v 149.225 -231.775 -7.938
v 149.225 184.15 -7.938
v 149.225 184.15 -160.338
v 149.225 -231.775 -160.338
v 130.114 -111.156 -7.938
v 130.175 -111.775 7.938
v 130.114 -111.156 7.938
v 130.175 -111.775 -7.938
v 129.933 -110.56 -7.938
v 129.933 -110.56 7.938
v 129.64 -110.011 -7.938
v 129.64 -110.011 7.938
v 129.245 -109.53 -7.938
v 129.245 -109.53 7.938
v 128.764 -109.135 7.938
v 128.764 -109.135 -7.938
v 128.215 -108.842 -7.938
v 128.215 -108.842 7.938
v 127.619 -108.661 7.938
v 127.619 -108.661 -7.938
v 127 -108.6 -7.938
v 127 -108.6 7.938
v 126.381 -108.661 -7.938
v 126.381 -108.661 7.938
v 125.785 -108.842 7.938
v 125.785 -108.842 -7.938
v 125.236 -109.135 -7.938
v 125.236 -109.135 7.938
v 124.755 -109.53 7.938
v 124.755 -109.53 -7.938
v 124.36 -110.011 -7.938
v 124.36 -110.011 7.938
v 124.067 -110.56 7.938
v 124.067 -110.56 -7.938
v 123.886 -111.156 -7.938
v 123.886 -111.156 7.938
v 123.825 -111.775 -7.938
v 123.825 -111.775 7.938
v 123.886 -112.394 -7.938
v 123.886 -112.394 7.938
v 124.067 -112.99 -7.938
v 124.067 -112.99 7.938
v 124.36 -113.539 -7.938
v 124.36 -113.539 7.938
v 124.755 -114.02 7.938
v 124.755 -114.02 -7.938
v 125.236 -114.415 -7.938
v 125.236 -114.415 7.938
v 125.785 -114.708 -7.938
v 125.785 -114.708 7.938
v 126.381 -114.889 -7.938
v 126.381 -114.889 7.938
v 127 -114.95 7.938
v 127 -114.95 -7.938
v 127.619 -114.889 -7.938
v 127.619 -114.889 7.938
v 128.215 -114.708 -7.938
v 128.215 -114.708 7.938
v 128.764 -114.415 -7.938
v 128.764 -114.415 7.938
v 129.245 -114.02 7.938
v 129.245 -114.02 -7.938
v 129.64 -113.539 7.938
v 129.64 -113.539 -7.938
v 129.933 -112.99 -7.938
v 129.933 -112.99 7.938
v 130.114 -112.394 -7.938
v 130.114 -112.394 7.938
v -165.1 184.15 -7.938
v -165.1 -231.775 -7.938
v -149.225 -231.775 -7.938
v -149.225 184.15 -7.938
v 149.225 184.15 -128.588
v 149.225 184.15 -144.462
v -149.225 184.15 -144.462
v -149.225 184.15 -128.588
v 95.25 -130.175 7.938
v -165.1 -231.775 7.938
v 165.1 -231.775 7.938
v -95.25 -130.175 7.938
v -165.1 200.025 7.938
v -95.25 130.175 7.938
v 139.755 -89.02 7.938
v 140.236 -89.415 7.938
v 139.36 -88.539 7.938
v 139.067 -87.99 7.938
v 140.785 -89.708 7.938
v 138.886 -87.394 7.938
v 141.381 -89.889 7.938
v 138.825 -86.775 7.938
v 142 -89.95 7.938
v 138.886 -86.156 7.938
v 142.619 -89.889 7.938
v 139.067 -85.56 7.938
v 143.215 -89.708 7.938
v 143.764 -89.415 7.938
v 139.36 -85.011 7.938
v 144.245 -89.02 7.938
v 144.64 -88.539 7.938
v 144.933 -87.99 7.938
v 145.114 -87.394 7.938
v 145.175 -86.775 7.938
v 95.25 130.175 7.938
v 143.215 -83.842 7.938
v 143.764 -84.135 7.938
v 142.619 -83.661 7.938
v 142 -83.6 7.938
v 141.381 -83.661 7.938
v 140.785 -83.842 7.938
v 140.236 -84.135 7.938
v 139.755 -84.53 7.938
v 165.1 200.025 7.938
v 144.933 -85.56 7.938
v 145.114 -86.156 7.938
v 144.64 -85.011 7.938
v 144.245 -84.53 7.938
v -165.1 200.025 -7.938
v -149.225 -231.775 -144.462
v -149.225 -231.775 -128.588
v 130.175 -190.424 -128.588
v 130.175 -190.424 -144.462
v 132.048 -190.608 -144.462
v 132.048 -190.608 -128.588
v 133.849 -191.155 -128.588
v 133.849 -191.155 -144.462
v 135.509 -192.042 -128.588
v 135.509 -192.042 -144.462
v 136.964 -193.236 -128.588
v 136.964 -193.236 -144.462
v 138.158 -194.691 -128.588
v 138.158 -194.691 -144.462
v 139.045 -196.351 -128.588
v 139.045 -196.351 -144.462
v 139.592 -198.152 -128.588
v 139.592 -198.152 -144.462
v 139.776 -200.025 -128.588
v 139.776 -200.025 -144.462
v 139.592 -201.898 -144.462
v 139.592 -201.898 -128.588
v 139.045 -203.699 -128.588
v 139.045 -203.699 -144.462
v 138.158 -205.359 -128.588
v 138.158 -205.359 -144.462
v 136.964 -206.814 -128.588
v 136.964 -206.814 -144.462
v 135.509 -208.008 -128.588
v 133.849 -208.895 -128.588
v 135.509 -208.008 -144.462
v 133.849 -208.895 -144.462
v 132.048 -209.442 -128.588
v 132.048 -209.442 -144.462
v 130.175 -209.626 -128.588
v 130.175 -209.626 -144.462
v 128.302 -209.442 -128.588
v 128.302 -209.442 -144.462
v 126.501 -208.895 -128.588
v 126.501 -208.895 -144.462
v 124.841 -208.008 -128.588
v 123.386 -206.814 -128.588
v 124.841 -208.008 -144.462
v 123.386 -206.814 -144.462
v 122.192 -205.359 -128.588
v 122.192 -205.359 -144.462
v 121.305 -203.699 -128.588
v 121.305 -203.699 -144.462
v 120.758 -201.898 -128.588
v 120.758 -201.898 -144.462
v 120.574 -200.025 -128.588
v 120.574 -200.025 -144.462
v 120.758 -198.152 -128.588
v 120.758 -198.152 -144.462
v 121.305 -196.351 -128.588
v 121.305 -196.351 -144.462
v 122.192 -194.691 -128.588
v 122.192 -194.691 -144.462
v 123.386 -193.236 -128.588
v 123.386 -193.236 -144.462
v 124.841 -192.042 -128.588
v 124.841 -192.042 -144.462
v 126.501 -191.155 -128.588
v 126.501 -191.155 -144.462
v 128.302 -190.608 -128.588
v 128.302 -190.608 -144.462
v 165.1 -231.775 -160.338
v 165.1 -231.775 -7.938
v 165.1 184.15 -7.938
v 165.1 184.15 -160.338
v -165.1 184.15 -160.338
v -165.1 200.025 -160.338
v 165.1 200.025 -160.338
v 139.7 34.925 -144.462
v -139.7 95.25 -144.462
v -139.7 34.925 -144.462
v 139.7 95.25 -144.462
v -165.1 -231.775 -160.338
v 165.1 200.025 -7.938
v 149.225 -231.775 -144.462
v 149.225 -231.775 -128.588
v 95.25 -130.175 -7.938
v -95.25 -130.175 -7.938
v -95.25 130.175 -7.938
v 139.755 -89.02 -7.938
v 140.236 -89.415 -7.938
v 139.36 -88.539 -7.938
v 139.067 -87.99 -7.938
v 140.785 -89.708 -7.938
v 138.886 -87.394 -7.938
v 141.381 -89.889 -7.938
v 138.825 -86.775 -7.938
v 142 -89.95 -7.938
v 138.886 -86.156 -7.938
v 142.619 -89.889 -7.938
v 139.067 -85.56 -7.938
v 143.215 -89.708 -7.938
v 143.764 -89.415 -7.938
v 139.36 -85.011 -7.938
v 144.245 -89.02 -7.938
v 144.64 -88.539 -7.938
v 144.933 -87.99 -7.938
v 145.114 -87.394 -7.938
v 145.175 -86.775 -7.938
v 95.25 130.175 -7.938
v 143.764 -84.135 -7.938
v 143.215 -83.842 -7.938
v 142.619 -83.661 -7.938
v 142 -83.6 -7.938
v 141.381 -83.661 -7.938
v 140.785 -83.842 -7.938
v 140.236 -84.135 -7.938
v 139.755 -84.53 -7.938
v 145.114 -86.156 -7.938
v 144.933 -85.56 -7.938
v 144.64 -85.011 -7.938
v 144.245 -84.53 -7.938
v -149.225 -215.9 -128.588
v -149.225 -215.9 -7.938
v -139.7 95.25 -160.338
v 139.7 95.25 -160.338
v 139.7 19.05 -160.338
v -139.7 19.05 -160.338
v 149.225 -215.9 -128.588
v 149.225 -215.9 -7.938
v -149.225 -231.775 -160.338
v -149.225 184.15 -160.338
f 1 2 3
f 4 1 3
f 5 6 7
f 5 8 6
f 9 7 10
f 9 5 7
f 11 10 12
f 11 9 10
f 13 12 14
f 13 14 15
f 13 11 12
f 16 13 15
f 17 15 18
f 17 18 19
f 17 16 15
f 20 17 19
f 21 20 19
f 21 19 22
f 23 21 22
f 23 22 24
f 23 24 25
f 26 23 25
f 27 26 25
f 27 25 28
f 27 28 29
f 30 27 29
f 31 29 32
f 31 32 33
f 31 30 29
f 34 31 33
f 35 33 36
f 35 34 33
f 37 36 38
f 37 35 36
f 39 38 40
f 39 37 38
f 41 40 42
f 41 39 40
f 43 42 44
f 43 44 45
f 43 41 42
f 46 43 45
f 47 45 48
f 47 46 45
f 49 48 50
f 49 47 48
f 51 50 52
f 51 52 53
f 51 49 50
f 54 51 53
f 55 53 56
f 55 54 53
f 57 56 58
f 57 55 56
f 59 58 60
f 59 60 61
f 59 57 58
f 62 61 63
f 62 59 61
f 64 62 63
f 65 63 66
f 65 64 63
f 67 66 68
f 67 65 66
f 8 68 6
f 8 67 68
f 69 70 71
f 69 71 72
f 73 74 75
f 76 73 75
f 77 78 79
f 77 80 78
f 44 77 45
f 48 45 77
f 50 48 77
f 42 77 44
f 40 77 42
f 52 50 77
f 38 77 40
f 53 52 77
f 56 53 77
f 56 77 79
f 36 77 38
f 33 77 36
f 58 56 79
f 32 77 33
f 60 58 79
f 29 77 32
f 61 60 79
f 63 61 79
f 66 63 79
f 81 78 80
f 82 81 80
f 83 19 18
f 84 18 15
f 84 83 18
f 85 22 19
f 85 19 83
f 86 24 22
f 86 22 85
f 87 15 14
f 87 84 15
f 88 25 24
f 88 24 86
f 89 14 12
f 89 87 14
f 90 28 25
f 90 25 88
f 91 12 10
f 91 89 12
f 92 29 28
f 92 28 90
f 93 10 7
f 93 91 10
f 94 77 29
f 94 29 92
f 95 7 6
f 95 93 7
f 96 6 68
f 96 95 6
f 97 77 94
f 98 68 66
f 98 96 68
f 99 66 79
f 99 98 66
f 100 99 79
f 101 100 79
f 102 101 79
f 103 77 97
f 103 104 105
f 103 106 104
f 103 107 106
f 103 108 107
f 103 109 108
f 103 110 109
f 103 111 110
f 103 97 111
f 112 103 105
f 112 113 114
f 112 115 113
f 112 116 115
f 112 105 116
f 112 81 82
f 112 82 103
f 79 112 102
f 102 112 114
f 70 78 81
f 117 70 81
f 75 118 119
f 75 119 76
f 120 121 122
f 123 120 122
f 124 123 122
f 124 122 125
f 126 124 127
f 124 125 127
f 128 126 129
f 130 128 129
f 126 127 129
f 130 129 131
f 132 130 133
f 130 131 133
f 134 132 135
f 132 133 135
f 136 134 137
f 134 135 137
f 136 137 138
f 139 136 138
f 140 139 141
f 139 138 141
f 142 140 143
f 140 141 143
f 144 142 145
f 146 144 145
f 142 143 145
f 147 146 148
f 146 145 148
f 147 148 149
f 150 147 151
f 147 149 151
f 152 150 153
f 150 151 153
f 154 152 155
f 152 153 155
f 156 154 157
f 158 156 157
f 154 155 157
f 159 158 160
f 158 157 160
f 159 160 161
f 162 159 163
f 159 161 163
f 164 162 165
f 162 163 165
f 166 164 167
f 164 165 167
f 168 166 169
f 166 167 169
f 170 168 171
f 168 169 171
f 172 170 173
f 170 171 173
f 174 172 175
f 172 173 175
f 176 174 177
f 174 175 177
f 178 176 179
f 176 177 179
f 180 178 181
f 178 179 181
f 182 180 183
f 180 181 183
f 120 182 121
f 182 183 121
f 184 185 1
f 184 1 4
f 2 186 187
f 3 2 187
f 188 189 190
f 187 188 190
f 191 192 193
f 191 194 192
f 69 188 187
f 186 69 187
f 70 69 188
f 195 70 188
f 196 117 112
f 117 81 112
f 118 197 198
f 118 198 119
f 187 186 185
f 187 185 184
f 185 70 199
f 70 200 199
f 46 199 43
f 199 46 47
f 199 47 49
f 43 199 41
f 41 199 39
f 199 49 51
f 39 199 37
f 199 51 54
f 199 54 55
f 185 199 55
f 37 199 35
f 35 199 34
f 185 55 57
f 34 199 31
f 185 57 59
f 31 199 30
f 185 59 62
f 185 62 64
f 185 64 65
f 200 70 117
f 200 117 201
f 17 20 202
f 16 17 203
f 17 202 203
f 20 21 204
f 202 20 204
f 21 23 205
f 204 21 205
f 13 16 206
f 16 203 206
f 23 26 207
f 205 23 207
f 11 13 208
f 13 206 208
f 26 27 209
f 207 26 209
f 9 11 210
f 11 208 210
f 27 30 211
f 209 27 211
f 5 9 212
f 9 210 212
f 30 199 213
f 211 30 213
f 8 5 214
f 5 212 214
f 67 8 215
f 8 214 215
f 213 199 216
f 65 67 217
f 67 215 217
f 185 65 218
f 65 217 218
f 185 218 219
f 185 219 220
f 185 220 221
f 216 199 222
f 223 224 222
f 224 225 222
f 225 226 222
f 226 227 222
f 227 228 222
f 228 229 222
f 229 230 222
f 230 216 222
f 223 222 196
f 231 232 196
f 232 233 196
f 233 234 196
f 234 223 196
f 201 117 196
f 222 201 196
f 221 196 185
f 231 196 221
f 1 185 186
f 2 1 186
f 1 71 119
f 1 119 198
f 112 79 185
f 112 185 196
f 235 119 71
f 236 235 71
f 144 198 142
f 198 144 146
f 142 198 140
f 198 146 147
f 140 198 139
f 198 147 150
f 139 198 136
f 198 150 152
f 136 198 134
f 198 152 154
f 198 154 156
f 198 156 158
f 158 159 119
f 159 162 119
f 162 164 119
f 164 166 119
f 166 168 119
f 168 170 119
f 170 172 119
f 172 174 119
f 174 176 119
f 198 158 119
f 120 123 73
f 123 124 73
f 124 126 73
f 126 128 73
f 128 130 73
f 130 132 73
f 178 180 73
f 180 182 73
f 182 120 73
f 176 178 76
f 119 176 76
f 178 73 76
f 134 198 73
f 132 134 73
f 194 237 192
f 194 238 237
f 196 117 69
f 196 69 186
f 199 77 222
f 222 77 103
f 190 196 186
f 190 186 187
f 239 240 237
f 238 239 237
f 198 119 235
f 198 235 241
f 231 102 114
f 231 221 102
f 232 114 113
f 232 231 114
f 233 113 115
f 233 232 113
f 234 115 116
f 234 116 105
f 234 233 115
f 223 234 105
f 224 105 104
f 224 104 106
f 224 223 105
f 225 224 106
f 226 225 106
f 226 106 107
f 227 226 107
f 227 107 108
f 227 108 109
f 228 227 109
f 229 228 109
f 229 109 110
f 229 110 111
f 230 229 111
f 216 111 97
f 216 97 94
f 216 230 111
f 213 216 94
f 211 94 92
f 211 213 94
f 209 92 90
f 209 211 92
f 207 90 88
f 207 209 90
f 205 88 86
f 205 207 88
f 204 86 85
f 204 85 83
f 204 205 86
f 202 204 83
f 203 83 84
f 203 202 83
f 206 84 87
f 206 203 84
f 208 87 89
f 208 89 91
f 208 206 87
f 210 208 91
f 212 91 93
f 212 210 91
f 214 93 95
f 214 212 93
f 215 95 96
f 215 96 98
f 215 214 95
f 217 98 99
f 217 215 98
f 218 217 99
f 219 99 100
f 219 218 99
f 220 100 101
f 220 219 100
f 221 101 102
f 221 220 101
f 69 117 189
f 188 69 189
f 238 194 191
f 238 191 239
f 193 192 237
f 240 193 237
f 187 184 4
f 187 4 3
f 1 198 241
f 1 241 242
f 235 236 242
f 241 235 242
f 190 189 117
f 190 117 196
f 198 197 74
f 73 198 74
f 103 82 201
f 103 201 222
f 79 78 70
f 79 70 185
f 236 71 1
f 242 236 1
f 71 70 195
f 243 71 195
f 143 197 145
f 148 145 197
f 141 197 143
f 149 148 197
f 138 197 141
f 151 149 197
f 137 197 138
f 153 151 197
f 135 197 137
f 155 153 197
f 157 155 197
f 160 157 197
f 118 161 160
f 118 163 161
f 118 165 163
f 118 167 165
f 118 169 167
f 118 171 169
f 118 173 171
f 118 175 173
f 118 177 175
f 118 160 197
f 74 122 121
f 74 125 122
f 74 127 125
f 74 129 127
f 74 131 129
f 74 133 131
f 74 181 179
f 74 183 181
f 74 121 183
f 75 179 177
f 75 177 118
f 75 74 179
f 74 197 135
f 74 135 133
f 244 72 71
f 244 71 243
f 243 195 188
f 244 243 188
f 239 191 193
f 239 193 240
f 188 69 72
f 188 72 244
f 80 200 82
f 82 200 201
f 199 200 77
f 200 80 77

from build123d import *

# Parameters (mm, degrees)
SKETCH1_W           = 330.2
SKETCH1_H           = 431.8
SKETCH1_R           = 3.175
SKETCH1_W_2         = 190.5
SKETCH1_H_2         = 260.35
BOSS_EXTRUDE1_DEPTH = 7.9375
SKETCH3_W           = 152.4
SKETCH3_H           = 415.925
BOSS_EXTRUDE2_DEPTH = 15.875
BOSS_EXTRUDE6_START = -15.875
SKETCH8_W           = 298.45
SKETCH8_H           = 415.925
SKETCH8_R           = 9.6012
BOSS_EXTRUDE6_DEPTH = 15.875
SKETCH11_W          = 298.45
SKETCH11_H          = 120.65
BOSS_EXTRUDE7_DEPTH = 15.875
SKETCH14_W          = 330.2
SKETCH14_H          = 152.4
BOSS_EXTRUDE8_DEPTH = 15.875
BOSS_EXTRUDE5_DEPTH = 139.7


with BuildPart() as part:
    # Sketch1 → Boss-Extrude1 (new, symmetric)
    with BuildSketch(Plane.XY):
        with Locations((0, -15.875)):
            Rectangle(SKETCH1_W, SKETCH1_H)
        with Locations((127, -111.775)):
            Circle(SKETCH1_R, mode=Mode.SUBTRACT)
        with Locations((142, -86.775)):
            Circle(SKETCH1_R, mode=Mode.SUBTRACT)
        Rectangle(SKETCH1_W_2, SKETCH1_H_2, mode=Mode.SUBTRACT)
    extrude(amount=BOSS_EXTRUDE1_DEPTH, both=True)


with BuildPart() as body_2:
    # Sketch3 → Boss-Extrude2 (new body)
    with BuildSketch(Plane(origin=(165.1, 0, 0), x_dir=(0, 0, -1), z_dir=(1, 0, 0))):
        with Locations((84.1375, -23.8125)):
            Rectangle(SKETCH3_W, SKETCH3_H)
    extrude(amount=-BOSS_EXTRUDE2_DEPTH)


with BuildPart() as body_3:
    # Mirror1: mirrored copy
    add(body_2.part.mirror(Plane(origin=(0, 0, 0), x_dir=(0, 0, 1), z_dir=(1, 0, 0))))


with BuildPart() as body_4:
    # Sketch8 → Boss-Extrude6 (new body)
    with BuildSketch(Plane(origin=(0, 0, -160.3375), x_dir=(-1, 0, 0), z_dir=(0, 0, -1)).offset(BOSS_EXTRUDE6_START)):
        with Locations((0, -23.8125)):
            Rectangle(SKETCH8_W, SKETCH8_H)
        with Locations(Location((-130.175, -200.025, 0), (0, 0, 90))):
            Circle(SKETCH8_R, mode=Mode.SUBTRACT)
    extrude(amount=-BOSS_EXTRUDE6_DEPTH)


with BuildPart() as body_5:
    # Sketch11 → Boss-Extrude7 (new body)
    with BuildSketch(Plane.XZ.offset(231.775)):
        with Locations((0, -68.2625)):
            Rectangle(SKETCH11_W, SKETCH11_H)
    extrude(amount=-BOSS_EXTRUDE7_DEPTH)


with BuildPart() as body_6:
    # Sketch14 → Boss-Extrude8 (new body)
    with BuildSketch(Plane(origin=(0, 200.025, 0), x_dir=(1, 0, 0), z_dir=(0, 1, 0))):
        with Locations((0, 84.1375)):
            Rectangle(SKETCH14_W, SKETCH14_H)
    extrude(amount=-BOSS_EXTRUDE8_DEPTH)


with BuildPart() as body_7:
    # Sketch7 → Boss-Extrude5 (new, symmetric)
    with BuildSketch(Plane(origin=(0, 0, 0), x_dir=(0, 0, -1), z_dir=(1, 0, 0))):
        Polygon((144.4625, 95.25), (144.4625, 34.925), (160.3375, 19.05), (160.3375, 95.25), align=None)
    extrude(amount=BOSS_EXTRUDE5_DEPTH, both=True)


solid = Compound([part.part, body_2.part, body_3.part, body_4.part, body_5.part, body_6.part, body_7.part])
